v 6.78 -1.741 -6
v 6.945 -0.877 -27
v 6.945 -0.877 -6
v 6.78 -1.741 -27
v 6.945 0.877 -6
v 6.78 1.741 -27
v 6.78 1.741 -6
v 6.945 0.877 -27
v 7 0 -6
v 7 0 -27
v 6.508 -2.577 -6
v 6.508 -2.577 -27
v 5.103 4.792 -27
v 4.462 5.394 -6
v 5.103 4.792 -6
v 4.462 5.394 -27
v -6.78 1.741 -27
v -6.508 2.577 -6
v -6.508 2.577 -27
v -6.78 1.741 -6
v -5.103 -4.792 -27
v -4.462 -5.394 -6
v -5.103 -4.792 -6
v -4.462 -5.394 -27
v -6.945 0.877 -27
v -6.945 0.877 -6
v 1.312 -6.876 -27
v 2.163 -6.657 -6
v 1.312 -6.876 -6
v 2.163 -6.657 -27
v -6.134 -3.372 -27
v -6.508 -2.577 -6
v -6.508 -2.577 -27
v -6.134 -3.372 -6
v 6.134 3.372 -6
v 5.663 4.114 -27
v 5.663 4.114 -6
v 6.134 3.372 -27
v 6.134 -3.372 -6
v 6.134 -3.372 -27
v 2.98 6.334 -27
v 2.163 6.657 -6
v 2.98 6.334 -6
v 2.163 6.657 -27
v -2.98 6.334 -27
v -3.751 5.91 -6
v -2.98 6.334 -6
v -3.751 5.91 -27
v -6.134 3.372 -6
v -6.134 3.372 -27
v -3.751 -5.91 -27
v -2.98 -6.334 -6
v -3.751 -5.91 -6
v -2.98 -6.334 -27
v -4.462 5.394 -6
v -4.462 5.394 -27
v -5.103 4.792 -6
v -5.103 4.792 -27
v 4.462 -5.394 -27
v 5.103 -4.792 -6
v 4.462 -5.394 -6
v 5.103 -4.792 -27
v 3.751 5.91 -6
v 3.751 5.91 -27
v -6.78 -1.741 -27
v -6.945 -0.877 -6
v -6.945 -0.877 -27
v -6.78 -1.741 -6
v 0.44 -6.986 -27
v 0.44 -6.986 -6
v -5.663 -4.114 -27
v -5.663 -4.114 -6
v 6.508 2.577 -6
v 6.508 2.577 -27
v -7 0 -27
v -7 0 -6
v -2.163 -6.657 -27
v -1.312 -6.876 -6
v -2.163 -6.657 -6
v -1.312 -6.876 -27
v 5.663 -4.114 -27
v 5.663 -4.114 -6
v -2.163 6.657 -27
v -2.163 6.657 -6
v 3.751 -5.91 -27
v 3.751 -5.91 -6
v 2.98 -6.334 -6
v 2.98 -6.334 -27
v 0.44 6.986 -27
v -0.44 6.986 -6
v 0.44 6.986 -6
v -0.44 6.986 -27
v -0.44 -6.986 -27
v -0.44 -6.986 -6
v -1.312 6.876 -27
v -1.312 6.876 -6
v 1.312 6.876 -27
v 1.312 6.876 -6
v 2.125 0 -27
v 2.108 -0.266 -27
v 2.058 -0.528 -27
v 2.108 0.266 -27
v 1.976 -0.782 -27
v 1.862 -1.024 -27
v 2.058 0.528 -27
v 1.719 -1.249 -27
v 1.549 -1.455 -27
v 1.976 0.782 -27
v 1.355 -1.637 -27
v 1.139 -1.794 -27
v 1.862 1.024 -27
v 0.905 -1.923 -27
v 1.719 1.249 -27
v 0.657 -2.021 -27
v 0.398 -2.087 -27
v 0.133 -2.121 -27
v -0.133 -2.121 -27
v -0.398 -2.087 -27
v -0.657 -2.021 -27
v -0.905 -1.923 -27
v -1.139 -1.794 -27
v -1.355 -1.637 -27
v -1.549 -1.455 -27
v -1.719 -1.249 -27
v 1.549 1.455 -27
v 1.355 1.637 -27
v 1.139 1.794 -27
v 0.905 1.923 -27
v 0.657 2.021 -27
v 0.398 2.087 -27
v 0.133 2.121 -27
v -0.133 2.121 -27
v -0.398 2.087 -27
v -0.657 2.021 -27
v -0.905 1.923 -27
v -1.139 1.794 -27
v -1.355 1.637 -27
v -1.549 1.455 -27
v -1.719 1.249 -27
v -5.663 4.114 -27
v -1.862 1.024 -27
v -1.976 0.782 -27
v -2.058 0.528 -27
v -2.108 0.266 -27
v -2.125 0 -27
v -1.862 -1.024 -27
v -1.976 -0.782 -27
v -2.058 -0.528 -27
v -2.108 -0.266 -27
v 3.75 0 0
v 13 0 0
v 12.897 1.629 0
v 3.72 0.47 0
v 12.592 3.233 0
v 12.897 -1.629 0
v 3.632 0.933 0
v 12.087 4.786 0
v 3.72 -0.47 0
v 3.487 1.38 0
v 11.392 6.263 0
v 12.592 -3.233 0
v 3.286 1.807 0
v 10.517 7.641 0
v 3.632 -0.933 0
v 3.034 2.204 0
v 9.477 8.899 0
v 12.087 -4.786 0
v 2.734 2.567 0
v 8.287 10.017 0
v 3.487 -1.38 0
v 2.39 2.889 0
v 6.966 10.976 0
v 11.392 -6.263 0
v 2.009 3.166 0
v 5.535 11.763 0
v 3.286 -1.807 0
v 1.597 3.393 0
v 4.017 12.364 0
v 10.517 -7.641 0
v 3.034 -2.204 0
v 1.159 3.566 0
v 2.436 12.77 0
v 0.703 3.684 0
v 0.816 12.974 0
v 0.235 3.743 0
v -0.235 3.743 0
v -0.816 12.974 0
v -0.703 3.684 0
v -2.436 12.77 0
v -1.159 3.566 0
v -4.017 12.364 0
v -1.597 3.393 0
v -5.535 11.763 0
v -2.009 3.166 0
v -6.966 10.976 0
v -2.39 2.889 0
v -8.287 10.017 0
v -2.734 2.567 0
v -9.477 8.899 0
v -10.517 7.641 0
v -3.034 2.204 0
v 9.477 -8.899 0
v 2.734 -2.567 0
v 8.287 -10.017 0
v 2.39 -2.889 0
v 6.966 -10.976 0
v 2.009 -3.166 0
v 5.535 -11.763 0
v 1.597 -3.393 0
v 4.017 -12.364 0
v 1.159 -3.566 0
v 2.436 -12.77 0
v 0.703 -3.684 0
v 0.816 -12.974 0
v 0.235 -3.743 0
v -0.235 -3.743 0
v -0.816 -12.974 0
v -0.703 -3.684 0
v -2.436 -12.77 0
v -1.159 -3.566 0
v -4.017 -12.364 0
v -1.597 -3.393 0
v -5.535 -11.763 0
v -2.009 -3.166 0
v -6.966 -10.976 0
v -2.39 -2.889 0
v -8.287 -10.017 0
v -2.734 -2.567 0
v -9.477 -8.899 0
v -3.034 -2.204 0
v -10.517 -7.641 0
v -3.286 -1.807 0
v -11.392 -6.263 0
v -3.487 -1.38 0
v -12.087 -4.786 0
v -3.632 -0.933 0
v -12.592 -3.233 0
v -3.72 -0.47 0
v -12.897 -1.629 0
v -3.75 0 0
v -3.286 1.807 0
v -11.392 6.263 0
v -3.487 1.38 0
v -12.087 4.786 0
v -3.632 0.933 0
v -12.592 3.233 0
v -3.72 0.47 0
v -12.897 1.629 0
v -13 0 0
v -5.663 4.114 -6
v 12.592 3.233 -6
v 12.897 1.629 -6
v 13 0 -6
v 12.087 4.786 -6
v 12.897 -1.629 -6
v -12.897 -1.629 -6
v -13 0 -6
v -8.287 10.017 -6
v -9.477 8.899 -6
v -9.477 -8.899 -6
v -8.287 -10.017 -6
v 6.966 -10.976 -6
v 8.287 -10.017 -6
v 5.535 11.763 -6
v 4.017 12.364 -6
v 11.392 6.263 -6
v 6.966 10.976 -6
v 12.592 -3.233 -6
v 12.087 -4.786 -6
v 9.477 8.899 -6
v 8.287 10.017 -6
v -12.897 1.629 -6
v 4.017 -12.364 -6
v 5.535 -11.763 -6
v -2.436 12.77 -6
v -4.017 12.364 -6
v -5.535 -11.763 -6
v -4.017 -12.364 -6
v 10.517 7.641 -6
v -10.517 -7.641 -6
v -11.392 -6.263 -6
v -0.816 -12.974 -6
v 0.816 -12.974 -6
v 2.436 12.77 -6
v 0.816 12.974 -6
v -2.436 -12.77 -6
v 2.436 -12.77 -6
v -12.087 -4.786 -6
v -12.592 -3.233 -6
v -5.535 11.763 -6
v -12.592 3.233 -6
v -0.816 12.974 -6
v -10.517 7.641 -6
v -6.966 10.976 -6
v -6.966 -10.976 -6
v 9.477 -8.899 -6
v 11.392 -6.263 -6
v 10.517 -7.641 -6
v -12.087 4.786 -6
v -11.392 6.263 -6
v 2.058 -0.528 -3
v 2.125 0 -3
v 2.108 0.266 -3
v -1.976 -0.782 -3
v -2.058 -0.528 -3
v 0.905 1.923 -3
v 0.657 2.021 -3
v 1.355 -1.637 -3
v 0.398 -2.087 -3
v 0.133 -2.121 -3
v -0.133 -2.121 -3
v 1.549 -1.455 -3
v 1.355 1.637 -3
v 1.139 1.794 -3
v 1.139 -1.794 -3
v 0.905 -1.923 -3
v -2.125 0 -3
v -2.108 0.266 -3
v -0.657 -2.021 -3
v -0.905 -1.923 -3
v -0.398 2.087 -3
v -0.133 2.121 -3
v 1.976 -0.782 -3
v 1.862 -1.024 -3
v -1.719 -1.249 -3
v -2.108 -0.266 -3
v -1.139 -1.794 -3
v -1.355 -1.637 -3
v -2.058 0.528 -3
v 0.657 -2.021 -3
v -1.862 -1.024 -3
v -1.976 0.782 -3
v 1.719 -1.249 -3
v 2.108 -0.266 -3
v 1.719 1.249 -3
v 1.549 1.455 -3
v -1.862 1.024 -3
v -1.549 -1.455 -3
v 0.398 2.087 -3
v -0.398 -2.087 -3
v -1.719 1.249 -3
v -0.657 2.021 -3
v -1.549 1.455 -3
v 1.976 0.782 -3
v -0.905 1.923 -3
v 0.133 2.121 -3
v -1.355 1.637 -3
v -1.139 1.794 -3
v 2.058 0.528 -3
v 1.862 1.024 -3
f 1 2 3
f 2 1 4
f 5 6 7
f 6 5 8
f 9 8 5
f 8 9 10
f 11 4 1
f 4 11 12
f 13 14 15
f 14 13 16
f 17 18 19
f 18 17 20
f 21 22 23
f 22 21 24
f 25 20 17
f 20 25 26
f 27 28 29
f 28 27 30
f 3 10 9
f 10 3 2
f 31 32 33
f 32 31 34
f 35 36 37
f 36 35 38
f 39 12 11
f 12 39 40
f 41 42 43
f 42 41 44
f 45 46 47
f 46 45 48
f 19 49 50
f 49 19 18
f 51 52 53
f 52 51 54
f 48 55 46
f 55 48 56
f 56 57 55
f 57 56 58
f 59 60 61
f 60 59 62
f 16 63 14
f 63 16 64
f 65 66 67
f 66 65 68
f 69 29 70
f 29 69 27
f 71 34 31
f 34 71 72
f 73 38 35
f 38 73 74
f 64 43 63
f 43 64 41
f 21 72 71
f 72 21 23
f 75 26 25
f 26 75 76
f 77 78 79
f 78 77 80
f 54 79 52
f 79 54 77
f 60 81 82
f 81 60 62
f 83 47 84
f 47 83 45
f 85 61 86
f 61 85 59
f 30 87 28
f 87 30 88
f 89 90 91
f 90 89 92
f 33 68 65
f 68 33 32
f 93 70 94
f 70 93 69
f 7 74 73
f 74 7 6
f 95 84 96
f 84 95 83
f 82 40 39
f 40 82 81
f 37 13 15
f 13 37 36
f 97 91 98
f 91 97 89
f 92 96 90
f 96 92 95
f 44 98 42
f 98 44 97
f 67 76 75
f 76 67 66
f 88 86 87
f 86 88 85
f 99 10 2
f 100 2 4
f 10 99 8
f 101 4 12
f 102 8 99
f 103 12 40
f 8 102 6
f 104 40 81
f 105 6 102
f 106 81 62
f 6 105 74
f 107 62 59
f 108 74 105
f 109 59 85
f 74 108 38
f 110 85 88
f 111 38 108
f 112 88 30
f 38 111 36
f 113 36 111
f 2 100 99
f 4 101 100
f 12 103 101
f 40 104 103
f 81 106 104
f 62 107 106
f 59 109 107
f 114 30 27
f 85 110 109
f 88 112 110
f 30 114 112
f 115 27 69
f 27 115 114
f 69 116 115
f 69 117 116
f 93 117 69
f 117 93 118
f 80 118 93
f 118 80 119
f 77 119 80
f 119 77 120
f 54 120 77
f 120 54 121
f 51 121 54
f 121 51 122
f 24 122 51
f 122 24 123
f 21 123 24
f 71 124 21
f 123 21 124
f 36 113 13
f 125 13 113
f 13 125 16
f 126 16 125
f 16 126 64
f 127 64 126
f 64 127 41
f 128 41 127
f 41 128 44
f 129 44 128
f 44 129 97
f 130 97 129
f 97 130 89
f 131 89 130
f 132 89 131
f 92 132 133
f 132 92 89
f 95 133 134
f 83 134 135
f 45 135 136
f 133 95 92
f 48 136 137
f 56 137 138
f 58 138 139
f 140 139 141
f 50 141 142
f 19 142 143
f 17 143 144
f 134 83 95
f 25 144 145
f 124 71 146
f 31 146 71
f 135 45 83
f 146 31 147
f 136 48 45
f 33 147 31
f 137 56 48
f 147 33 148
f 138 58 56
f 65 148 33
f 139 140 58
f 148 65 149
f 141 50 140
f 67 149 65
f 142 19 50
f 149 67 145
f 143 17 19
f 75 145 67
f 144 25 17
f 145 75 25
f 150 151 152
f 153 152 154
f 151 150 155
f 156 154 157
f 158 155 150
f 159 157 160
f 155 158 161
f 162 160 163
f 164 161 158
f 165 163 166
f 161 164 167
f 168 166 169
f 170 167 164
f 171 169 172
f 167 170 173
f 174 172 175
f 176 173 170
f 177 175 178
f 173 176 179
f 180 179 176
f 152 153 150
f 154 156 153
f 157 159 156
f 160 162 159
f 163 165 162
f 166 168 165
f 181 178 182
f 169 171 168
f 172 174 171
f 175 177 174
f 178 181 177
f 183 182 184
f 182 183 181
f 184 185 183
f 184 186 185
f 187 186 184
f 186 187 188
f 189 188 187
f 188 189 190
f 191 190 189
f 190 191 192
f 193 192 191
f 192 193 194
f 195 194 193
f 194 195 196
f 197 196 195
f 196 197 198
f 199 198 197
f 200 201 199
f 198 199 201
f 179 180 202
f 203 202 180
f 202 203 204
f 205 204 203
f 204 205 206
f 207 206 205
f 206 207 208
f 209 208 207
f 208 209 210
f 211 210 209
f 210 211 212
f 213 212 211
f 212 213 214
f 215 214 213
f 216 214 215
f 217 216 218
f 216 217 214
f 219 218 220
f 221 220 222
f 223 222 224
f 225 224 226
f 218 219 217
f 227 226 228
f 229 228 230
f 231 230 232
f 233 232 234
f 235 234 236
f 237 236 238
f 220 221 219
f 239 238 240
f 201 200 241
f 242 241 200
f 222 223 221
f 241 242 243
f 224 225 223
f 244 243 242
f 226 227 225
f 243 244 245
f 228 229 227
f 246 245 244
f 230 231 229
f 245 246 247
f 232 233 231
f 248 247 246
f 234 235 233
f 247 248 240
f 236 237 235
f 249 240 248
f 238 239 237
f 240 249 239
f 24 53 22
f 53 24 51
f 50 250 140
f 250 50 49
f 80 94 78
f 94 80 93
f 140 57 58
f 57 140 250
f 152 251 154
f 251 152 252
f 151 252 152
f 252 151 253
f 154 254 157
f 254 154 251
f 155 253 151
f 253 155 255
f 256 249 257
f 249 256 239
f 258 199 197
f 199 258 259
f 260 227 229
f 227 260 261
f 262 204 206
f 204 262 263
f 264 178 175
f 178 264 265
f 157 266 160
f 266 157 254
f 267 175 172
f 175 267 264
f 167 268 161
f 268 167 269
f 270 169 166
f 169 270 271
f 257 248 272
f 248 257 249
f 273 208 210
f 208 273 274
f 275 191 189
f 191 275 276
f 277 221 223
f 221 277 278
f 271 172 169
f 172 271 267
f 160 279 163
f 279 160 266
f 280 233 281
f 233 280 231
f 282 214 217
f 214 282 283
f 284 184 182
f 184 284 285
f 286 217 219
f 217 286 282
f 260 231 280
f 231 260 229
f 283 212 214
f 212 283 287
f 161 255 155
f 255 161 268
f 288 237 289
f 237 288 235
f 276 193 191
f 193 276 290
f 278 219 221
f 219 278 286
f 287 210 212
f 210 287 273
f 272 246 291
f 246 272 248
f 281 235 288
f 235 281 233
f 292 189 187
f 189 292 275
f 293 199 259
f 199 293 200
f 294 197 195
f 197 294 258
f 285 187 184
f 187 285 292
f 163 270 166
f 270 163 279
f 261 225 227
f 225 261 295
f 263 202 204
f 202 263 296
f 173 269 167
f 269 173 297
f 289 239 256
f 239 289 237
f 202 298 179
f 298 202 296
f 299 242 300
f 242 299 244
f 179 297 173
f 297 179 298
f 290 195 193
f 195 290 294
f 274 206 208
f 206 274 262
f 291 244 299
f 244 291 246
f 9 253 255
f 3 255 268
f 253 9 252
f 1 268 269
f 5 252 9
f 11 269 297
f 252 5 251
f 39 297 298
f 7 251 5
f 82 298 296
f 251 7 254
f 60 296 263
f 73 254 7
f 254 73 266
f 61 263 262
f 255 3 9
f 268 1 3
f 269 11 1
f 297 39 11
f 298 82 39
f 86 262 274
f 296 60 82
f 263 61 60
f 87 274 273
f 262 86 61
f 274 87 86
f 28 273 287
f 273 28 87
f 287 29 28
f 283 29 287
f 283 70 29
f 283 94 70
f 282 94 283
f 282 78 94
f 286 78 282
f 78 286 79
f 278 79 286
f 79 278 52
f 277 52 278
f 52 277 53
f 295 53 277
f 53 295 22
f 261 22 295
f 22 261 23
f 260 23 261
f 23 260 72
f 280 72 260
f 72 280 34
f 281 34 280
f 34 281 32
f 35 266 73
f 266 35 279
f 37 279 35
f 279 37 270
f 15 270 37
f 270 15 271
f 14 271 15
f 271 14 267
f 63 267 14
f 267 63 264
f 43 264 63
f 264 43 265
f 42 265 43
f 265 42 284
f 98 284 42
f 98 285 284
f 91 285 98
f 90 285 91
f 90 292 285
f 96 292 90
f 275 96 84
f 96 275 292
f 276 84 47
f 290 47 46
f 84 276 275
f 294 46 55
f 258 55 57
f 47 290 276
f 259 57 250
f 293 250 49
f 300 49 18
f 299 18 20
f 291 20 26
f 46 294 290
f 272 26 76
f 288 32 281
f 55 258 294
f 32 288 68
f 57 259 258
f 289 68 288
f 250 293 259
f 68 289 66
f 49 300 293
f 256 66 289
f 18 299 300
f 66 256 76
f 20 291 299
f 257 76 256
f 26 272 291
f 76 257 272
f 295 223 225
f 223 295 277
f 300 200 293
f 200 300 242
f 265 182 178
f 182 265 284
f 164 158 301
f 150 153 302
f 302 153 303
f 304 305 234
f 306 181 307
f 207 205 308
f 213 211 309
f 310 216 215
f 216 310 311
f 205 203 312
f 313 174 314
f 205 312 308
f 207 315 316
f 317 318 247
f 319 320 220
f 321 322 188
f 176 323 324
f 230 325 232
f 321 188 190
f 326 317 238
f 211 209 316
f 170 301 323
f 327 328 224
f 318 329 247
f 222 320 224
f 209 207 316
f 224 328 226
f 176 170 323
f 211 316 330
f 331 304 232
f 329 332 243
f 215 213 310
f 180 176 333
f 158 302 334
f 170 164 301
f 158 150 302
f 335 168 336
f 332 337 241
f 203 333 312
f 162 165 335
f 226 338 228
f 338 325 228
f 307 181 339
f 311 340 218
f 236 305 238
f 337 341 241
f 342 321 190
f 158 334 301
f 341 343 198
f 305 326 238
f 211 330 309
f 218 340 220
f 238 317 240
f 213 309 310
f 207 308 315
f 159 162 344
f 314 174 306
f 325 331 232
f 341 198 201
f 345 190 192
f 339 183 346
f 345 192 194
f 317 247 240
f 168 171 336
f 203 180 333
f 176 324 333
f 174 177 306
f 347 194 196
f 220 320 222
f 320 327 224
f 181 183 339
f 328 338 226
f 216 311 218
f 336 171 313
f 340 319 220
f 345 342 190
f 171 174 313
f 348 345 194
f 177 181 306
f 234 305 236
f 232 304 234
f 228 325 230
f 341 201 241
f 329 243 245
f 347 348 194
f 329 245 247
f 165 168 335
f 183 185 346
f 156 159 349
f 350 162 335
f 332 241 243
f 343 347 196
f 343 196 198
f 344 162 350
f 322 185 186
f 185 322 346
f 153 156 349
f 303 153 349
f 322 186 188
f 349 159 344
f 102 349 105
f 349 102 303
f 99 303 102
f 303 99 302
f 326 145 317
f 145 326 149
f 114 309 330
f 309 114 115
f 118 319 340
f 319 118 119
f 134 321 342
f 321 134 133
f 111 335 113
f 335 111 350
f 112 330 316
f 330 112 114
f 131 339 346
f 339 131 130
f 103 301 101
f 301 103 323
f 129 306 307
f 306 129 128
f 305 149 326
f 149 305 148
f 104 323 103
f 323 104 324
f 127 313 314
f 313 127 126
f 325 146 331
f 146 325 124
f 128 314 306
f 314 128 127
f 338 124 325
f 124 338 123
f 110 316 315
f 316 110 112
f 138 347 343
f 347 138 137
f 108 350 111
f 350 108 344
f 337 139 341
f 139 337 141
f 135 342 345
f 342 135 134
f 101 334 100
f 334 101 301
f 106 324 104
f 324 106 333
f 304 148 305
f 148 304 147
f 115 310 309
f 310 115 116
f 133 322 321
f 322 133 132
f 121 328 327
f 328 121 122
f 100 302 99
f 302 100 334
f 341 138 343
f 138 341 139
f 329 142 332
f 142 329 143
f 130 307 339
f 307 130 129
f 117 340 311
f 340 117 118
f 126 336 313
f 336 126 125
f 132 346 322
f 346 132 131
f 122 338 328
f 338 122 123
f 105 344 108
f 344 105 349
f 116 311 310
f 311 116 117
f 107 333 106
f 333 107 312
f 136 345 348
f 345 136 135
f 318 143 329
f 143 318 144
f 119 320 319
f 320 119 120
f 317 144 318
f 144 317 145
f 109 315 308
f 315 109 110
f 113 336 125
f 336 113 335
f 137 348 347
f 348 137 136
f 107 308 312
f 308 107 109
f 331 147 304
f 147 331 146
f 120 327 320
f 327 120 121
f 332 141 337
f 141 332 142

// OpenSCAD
$fn = 50;


difference() {
	union() {
		translate(v = [0, 0, -27.0000000000]) {
			cylinder(h = 27, r = 7.0000000000);
		}
		translate(v = [0, 0, -6.0000000000]) {
			cylinder(h = 6, r = 13.0000000000);
		}
	}
	union() {
		translate(v = [0, 0, 0]) {
			rotate(a = [0, 0, 0]) {
				difference() {
					union() {
						#translate(v = [0, 0, -27.0000000000]) {
							cylinder(h = 27, r = 2.0000000000);
						}
						#translate(v = [0, 0, -3]) {
							cylinder(h = 3, r1 = 2.1250000000, r2 = 3.7500000000);
						}
						#translate(v = [0, 0, -27.0000000000]) {
							cylinder(h = 27, r = 2.1250000000);
						}
						#translate(v = [0, 0, -27.0000000000]) {
							cylinder(h = 27, r = 2.0000000000);
						}
					}
					union();
				}
			}
		}
	}
}
